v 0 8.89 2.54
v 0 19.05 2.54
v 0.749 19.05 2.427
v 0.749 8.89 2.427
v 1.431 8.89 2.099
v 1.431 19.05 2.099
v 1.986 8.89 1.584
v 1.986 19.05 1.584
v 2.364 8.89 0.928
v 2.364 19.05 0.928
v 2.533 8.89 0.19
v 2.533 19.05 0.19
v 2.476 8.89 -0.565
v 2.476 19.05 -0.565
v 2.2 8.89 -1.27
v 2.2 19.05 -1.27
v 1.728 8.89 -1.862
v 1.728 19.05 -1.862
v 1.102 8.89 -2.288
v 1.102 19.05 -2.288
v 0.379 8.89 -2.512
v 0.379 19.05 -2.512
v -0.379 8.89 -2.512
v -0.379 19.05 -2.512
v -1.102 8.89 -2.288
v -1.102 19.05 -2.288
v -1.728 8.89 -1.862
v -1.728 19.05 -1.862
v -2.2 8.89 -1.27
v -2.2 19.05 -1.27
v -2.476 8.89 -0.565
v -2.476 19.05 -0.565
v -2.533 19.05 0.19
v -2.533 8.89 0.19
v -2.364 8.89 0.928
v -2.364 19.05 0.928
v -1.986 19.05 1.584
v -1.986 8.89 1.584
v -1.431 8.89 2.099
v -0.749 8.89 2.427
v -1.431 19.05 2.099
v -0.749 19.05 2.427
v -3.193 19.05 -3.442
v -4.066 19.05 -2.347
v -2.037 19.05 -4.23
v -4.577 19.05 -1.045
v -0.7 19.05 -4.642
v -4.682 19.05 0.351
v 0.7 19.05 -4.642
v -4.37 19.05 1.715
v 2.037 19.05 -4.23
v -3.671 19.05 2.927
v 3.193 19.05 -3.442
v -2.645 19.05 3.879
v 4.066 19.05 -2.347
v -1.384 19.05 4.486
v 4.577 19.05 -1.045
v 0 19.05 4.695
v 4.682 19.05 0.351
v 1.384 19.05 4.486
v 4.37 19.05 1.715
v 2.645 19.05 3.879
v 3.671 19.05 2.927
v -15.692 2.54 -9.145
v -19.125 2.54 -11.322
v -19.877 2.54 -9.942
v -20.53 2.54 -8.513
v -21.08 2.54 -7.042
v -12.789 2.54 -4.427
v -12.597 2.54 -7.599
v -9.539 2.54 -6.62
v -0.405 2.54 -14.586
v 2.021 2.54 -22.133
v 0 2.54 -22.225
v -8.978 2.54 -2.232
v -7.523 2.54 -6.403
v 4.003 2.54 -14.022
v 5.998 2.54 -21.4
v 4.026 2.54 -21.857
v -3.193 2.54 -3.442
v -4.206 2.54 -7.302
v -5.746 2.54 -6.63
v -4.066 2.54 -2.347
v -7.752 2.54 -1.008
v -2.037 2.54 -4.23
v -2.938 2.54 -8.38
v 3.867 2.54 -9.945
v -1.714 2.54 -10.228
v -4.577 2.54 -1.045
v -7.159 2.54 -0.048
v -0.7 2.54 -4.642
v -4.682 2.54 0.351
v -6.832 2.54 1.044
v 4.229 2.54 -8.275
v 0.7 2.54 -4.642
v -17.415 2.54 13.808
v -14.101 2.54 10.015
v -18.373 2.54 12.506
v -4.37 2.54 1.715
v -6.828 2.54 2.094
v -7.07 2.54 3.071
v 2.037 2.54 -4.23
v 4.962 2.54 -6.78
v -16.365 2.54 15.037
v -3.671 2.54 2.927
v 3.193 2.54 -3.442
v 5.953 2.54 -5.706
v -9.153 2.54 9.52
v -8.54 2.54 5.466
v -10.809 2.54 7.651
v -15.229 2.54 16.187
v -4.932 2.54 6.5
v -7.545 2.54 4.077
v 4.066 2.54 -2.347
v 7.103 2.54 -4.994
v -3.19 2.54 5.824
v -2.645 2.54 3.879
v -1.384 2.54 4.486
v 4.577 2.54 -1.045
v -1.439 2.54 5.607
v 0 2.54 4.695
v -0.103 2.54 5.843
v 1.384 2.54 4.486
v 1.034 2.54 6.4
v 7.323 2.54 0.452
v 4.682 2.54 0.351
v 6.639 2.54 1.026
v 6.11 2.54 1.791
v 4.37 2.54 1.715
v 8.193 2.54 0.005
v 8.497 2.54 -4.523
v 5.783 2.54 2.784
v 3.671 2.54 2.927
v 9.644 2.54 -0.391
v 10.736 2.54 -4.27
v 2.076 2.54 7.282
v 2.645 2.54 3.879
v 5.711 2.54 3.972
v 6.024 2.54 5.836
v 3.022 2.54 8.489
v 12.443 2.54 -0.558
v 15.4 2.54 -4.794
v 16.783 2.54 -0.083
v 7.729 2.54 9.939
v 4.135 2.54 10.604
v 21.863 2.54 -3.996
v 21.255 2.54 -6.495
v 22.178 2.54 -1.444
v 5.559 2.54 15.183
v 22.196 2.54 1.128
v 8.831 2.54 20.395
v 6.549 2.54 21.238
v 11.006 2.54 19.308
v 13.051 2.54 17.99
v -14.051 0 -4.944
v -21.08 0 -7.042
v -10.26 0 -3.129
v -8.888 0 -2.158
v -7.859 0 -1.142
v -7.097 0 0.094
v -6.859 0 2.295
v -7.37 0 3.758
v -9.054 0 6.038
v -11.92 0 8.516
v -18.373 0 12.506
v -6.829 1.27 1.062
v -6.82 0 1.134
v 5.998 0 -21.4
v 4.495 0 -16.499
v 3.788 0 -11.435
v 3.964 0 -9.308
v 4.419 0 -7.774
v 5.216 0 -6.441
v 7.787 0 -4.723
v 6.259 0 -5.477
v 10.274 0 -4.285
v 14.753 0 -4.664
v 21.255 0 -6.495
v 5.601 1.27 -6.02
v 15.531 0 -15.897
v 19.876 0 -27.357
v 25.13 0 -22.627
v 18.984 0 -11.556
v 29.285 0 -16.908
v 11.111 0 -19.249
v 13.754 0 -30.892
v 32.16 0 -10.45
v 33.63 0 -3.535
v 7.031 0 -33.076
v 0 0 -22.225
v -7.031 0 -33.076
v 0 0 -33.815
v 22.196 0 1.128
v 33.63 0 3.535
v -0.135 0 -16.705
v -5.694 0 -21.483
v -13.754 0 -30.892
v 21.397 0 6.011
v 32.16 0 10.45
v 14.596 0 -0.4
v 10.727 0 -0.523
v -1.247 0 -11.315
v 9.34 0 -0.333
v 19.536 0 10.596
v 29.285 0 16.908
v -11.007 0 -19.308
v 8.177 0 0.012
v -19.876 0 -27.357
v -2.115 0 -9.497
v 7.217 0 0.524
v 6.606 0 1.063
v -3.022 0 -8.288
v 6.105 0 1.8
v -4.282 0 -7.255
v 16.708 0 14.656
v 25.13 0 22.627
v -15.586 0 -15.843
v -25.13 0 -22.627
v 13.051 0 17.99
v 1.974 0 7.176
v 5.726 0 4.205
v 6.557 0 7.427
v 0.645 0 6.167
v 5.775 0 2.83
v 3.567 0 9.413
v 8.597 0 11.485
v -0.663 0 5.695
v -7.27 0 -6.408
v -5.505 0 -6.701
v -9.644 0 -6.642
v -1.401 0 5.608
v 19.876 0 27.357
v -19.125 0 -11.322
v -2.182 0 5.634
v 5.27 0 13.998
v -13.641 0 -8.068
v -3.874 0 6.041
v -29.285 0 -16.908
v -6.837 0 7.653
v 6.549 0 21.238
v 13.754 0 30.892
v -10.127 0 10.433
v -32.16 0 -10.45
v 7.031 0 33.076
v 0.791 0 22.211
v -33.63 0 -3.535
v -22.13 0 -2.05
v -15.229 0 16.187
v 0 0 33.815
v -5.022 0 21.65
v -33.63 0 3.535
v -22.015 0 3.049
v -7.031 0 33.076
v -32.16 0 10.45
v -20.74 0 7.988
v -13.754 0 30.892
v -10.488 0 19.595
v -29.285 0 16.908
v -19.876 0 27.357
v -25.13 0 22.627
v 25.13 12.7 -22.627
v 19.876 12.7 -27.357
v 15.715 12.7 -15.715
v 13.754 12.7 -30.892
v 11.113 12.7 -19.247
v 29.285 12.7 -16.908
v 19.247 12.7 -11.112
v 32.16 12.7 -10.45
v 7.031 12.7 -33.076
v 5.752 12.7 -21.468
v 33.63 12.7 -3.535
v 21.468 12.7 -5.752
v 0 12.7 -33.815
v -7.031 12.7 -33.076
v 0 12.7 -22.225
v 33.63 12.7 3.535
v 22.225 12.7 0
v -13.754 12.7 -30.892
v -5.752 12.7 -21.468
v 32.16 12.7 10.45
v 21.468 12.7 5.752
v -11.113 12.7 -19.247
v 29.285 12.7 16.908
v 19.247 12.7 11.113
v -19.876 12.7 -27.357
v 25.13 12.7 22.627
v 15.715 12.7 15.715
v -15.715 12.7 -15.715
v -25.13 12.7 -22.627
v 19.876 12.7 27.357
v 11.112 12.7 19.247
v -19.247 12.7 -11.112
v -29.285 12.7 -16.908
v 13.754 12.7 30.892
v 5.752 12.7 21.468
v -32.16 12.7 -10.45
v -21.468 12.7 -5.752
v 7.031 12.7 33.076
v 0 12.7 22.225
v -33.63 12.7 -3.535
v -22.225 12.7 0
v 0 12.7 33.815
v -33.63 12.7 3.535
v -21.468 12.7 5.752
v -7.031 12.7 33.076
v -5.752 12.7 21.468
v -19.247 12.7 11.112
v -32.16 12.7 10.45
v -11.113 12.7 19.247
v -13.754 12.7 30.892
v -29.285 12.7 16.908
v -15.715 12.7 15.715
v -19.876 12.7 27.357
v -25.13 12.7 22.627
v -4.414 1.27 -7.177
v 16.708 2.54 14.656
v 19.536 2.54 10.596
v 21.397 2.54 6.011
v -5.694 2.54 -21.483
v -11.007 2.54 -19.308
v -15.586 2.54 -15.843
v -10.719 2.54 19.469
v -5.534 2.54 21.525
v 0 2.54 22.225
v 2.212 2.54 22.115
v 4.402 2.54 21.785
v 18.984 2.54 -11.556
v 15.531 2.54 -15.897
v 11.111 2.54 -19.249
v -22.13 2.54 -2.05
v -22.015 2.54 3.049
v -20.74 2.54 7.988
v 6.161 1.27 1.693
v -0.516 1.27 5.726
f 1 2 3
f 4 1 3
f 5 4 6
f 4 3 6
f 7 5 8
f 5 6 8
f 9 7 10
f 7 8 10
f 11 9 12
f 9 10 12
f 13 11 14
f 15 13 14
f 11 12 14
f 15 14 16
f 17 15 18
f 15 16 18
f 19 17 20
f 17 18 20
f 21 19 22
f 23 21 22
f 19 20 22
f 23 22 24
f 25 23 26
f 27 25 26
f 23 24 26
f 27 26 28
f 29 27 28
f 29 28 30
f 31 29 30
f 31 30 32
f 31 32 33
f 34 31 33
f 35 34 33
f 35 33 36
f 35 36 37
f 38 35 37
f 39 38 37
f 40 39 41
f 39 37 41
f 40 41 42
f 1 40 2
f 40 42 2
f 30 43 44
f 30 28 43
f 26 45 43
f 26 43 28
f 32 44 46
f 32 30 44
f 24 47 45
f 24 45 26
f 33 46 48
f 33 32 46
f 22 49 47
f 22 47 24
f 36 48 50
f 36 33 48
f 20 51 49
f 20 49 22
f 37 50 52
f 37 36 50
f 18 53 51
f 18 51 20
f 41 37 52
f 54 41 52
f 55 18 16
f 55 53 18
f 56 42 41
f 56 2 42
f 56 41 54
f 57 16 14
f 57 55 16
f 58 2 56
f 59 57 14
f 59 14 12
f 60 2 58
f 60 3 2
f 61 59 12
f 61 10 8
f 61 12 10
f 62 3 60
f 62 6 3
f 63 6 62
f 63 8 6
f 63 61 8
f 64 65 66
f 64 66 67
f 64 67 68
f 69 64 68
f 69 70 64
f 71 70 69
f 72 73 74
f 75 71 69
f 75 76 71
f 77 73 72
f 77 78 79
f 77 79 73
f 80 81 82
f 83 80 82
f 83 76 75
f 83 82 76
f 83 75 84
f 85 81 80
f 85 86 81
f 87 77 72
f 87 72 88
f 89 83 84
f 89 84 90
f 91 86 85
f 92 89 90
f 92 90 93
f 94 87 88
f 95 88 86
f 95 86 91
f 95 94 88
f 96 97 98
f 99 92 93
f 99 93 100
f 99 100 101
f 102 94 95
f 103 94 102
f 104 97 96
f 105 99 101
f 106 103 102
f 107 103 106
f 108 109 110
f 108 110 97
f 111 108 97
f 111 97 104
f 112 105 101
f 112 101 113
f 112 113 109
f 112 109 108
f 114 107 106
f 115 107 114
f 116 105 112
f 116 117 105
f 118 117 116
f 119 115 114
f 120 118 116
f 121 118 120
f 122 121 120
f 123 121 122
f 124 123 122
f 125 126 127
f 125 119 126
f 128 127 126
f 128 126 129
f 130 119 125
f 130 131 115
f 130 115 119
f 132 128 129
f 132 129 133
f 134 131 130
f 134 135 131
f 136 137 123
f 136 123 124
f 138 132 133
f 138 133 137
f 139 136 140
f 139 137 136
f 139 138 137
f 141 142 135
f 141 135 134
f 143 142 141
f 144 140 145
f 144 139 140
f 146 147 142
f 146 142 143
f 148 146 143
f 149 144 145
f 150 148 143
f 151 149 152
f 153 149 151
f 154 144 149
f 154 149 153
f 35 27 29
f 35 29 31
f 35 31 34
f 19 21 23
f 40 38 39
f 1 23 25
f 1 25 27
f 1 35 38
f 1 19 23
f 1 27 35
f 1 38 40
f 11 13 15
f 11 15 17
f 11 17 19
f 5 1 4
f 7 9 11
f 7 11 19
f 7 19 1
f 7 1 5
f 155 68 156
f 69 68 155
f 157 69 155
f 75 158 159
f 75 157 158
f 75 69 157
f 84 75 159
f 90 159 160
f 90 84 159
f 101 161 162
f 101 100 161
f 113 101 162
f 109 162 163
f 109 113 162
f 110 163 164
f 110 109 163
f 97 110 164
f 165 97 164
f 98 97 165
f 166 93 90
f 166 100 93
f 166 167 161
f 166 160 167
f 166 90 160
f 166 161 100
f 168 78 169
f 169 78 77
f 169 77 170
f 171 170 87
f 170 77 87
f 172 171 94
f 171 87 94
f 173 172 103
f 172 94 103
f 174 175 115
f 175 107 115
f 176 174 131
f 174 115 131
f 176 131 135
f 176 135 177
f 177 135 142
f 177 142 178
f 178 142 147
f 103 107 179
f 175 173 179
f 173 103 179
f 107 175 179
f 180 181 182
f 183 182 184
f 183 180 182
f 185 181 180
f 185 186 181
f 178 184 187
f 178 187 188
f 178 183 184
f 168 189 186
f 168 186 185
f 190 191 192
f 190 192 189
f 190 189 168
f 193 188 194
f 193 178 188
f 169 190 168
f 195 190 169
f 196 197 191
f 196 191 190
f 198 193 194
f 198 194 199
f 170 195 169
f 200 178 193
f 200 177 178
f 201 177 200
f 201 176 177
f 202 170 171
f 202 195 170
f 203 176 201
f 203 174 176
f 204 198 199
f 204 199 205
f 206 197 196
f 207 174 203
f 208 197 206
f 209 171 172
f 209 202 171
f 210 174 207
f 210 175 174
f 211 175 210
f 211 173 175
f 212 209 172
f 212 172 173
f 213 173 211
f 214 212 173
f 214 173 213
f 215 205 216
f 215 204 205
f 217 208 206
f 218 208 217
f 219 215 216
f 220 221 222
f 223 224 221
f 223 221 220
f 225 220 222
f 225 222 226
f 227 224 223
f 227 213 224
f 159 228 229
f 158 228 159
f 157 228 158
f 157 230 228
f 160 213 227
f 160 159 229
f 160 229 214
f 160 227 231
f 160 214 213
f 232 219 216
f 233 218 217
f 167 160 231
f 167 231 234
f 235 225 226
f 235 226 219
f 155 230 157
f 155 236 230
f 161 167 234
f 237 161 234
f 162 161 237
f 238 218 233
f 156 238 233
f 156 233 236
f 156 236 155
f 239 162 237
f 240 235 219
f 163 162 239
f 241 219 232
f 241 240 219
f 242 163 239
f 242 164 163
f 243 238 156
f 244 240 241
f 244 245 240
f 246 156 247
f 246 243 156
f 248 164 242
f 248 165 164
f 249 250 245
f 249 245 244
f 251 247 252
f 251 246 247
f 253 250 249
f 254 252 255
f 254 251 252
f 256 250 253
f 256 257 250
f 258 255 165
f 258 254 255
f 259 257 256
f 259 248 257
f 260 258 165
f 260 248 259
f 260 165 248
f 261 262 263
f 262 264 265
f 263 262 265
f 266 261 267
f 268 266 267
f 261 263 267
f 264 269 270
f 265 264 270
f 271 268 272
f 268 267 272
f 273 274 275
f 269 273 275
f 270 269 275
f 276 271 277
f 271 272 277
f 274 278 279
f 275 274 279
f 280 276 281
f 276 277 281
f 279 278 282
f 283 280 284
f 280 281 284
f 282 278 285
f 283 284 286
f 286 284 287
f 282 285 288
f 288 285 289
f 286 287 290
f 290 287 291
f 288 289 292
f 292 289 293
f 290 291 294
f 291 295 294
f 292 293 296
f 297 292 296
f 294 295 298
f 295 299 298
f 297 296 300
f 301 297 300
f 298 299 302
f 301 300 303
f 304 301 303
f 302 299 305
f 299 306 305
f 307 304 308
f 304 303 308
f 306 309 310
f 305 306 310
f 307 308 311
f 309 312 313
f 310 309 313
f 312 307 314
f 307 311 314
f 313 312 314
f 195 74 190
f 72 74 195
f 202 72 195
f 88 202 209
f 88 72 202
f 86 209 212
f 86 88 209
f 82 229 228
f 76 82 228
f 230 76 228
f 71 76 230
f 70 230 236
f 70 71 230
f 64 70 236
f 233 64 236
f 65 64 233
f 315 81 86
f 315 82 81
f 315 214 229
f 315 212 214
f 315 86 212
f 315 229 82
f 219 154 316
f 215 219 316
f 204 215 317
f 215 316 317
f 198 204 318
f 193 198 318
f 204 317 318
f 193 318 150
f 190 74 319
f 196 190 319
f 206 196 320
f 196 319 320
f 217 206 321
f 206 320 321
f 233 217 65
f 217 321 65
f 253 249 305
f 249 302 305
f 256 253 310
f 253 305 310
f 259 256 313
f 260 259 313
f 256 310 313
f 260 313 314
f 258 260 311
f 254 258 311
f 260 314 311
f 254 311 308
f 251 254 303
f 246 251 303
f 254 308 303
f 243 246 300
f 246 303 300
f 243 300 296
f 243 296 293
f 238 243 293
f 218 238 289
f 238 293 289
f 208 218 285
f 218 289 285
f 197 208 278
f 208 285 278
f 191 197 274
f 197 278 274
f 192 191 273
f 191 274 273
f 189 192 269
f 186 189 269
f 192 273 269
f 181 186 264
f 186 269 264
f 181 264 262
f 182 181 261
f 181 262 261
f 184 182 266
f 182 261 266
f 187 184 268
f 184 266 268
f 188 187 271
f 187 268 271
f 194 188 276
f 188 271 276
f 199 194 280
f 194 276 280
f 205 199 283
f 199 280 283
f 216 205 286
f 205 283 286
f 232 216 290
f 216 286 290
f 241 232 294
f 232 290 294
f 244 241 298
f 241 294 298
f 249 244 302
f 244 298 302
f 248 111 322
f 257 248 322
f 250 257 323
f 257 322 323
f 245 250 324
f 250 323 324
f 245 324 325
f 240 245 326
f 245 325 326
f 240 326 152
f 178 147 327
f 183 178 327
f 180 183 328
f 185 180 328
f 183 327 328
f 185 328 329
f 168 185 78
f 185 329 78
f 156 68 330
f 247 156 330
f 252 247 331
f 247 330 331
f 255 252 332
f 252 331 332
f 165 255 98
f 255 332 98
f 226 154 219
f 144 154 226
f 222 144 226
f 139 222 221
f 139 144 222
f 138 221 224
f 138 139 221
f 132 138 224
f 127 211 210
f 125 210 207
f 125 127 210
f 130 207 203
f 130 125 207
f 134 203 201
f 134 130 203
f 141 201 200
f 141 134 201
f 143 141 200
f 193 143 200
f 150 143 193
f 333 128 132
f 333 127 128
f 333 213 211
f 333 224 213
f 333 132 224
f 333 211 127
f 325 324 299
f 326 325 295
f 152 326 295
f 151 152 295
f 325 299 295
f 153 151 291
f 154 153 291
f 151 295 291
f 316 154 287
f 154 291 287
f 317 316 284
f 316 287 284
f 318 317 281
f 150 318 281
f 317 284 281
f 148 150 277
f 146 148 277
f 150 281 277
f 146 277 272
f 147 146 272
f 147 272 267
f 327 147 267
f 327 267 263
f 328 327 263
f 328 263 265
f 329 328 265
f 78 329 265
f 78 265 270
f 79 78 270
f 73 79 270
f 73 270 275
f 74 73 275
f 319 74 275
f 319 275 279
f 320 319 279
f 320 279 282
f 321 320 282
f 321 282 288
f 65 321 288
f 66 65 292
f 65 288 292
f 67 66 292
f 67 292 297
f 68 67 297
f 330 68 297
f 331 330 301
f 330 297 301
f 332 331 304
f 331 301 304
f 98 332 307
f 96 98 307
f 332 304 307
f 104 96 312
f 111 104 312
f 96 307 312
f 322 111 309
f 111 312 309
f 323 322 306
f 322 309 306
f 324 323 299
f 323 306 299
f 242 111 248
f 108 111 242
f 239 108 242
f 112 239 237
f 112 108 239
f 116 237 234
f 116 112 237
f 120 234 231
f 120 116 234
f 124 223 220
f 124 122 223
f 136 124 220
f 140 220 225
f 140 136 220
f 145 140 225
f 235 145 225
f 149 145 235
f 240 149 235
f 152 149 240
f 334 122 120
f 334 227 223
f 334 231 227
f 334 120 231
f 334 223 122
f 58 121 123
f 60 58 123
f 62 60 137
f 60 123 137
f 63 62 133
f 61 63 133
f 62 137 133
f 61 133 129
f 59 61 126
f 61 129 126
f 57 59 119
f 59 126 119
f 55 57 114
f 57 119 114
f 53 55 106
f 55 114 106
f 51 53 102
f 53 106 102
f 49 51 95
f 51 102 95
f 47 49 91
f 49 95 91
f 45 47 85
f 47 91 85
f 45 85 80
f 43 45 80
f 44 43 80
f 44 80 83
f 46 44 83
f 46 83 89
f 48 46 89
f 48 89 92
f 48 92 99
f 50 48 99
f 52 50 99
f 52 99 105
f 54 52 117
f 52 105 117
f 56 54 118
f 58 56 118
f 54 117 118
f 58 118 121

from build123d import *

# Parameters (mm, degrees)
SKETCH3_R           = 31.75
BOSS_EXTRUDE1_DEPTH = 12.7
SKETCH4_R           = 22.225
CUT_EXTRUDE1_DEPTH  = 10.16
CUT_EXTRUDE2_DEPTH  = 10.16
SKETCH8_R           = 4.694761347
BOSS_EXTRUDE2_DEPTH = 16.51
SKETCH9_R           = 2.54
CUT_EXTRUDE3_DEPTH  = 10.16
SKETCH10_W          = 2.065443221
SKETCH10_H          = 12.7


with BuildPart() as part:
    # Sketch3 → Boss-Extrude1 (new body)
    with BuildSketch(Plane(origin=(0, 0, 0), x_dir=(1, 0, 0), z_dir=(0, 1, 0))):
        with Locations(Location((0, 0, 0), (0, 0, 270))):
            Circle(SKETCH3_R)
    extrude(amount=BOSS_EXTRUDE1_DEPTH)

    # Sketch4 → Cut-Extrude1 (cut)
    with BuildSketch(Plane(origin=(0, 12.7, 0), x_dir=(1, 0, 0), z_dir=(0, 1, 0))):
        with Locations(Location((0, 0, 0), (0, 0, 270))):
            Circle(SKETCH4_R)
    extrude(amount=-CUT_EXTRUDE1_DEPTH, mode=Mode.SUBTRACT)

    # Sketch7 → Cut-Extrude2 (cut)
    with BuildSketch(Plane(origin=(0, 2.54, 0), x_dir=(1, 0, 0), z_dir=(0, 1, 0))):
        with BuildLine():
            ThreePointArc((-15.229385619, -16.18692184), (-5.02164827, -21.65025805), (6.548839828, -21.238251385))
            add(Edge.make_bspline(
                [(-15.229385619, -16.18692184), (3.307519141, 7.259643736), (6.548839828, -21.238251385)],
                knots=[0, 0, 0, 1, 1, 1], degree=2))
        make_face()
        with BuildLine():
            ThreePointArc((13.050551616, -17.989822887), (19.536316665, -10.596365234), (22.196363392, -1.127863993))
            add(Edge.make_bspline(
                [(13.050551616, -17.989822887), (-5.30189954, 6.172036524), (22.196363392, -1.127863993)],
                knots=[0, 0, 0, 1, 1, 1], degree=2))
        make_face()
        with BuildLine():
            ThreePointArc((21.254913667, 6.494556954), (15.531294033, 15.897469316), (5.997580887, 21.400459072))
            add(Edge.make_bspline(
                [(5.997580887, 21.400459072), (-2.424740226, -1.907285391), (21.254913667, 6.494556954)],
                knots=[0, 0, 0, 1, 1, 1], degree=2))
        make_face()
        with BuildLine():
            ThreePointArc((0, 22.225), (-11.007401994, 19.307711577), (-19.125106224, 11.321702033))
            add(Edge.make_bspline(
                [(0, 22.225), (0.733559441, -2.419288654), (-19.125106224, 11.321702033)],
                knots=[0, 0, 0, 1, 1, 1], degree=2))
        make_face()
        with BuildLine():
            ThreePointArc((-21.0799969, 7.041615986), (-22.014836277, -3.049198044), (-18.372518541, -12.506046036))
            add(Edge.make_bspline(
                [(-21.0799969, 7.041615986), (6.067470104, 0.607937187), (-18.372518541, -12.506046036)],
                knots=[0, 0, 0, 1, 1, 1], degree=2))
        make_face()
    extrude(amount=-CUT_EXTRUDE2_DEPTH, mode=Mode.SUBTRACT)

    # Sketch8 → Boss-Extrude2 (add)
    with BuildSketch(Plane(origin=(0, 2.54, 0), x_dir=(1, 0, 0), z_dir=(0, 1, 0))):
        with Locations(Location((0, 0, 0), (0, 0, 270))):
            Circle(SKETCH8_R)
    extrude(amount=BOSS_EXTRUDE2_DEPTH)

    # Sketch9 → Cut-Extrude3 (cut)
    with BuildSketch(Plane(origin=(0, 19.05, 0), x_dir=(1, 0, 0), z_dir=(0, 1, 0))):
        with Locations(Location((0, 0, 0), (0, 0, 270))):
            Circle(SKETCH9_R)
    extrude(amount=-CUT_EXTRUDE3_DEPTH, mode=Mode.SUBTRACT)

    # Sketch10 → Revolve1 (revolve)
    with BuildSketch(Plane.XY, mode=Mode.PRIVATE) as revolve1_sk:
        with Locations((-32.782721611, 6.35)):
            Rectangle(SKETCH10_W, SKETCH10_H)
    revolve(revolve1_sk.sketch.rotate(Axis((0, 24.137894977, 0), (0, -1, 0)), 270), axis=Axis((0, 24.137894977, 0), (0, -1, 0)))


solid = part.part
